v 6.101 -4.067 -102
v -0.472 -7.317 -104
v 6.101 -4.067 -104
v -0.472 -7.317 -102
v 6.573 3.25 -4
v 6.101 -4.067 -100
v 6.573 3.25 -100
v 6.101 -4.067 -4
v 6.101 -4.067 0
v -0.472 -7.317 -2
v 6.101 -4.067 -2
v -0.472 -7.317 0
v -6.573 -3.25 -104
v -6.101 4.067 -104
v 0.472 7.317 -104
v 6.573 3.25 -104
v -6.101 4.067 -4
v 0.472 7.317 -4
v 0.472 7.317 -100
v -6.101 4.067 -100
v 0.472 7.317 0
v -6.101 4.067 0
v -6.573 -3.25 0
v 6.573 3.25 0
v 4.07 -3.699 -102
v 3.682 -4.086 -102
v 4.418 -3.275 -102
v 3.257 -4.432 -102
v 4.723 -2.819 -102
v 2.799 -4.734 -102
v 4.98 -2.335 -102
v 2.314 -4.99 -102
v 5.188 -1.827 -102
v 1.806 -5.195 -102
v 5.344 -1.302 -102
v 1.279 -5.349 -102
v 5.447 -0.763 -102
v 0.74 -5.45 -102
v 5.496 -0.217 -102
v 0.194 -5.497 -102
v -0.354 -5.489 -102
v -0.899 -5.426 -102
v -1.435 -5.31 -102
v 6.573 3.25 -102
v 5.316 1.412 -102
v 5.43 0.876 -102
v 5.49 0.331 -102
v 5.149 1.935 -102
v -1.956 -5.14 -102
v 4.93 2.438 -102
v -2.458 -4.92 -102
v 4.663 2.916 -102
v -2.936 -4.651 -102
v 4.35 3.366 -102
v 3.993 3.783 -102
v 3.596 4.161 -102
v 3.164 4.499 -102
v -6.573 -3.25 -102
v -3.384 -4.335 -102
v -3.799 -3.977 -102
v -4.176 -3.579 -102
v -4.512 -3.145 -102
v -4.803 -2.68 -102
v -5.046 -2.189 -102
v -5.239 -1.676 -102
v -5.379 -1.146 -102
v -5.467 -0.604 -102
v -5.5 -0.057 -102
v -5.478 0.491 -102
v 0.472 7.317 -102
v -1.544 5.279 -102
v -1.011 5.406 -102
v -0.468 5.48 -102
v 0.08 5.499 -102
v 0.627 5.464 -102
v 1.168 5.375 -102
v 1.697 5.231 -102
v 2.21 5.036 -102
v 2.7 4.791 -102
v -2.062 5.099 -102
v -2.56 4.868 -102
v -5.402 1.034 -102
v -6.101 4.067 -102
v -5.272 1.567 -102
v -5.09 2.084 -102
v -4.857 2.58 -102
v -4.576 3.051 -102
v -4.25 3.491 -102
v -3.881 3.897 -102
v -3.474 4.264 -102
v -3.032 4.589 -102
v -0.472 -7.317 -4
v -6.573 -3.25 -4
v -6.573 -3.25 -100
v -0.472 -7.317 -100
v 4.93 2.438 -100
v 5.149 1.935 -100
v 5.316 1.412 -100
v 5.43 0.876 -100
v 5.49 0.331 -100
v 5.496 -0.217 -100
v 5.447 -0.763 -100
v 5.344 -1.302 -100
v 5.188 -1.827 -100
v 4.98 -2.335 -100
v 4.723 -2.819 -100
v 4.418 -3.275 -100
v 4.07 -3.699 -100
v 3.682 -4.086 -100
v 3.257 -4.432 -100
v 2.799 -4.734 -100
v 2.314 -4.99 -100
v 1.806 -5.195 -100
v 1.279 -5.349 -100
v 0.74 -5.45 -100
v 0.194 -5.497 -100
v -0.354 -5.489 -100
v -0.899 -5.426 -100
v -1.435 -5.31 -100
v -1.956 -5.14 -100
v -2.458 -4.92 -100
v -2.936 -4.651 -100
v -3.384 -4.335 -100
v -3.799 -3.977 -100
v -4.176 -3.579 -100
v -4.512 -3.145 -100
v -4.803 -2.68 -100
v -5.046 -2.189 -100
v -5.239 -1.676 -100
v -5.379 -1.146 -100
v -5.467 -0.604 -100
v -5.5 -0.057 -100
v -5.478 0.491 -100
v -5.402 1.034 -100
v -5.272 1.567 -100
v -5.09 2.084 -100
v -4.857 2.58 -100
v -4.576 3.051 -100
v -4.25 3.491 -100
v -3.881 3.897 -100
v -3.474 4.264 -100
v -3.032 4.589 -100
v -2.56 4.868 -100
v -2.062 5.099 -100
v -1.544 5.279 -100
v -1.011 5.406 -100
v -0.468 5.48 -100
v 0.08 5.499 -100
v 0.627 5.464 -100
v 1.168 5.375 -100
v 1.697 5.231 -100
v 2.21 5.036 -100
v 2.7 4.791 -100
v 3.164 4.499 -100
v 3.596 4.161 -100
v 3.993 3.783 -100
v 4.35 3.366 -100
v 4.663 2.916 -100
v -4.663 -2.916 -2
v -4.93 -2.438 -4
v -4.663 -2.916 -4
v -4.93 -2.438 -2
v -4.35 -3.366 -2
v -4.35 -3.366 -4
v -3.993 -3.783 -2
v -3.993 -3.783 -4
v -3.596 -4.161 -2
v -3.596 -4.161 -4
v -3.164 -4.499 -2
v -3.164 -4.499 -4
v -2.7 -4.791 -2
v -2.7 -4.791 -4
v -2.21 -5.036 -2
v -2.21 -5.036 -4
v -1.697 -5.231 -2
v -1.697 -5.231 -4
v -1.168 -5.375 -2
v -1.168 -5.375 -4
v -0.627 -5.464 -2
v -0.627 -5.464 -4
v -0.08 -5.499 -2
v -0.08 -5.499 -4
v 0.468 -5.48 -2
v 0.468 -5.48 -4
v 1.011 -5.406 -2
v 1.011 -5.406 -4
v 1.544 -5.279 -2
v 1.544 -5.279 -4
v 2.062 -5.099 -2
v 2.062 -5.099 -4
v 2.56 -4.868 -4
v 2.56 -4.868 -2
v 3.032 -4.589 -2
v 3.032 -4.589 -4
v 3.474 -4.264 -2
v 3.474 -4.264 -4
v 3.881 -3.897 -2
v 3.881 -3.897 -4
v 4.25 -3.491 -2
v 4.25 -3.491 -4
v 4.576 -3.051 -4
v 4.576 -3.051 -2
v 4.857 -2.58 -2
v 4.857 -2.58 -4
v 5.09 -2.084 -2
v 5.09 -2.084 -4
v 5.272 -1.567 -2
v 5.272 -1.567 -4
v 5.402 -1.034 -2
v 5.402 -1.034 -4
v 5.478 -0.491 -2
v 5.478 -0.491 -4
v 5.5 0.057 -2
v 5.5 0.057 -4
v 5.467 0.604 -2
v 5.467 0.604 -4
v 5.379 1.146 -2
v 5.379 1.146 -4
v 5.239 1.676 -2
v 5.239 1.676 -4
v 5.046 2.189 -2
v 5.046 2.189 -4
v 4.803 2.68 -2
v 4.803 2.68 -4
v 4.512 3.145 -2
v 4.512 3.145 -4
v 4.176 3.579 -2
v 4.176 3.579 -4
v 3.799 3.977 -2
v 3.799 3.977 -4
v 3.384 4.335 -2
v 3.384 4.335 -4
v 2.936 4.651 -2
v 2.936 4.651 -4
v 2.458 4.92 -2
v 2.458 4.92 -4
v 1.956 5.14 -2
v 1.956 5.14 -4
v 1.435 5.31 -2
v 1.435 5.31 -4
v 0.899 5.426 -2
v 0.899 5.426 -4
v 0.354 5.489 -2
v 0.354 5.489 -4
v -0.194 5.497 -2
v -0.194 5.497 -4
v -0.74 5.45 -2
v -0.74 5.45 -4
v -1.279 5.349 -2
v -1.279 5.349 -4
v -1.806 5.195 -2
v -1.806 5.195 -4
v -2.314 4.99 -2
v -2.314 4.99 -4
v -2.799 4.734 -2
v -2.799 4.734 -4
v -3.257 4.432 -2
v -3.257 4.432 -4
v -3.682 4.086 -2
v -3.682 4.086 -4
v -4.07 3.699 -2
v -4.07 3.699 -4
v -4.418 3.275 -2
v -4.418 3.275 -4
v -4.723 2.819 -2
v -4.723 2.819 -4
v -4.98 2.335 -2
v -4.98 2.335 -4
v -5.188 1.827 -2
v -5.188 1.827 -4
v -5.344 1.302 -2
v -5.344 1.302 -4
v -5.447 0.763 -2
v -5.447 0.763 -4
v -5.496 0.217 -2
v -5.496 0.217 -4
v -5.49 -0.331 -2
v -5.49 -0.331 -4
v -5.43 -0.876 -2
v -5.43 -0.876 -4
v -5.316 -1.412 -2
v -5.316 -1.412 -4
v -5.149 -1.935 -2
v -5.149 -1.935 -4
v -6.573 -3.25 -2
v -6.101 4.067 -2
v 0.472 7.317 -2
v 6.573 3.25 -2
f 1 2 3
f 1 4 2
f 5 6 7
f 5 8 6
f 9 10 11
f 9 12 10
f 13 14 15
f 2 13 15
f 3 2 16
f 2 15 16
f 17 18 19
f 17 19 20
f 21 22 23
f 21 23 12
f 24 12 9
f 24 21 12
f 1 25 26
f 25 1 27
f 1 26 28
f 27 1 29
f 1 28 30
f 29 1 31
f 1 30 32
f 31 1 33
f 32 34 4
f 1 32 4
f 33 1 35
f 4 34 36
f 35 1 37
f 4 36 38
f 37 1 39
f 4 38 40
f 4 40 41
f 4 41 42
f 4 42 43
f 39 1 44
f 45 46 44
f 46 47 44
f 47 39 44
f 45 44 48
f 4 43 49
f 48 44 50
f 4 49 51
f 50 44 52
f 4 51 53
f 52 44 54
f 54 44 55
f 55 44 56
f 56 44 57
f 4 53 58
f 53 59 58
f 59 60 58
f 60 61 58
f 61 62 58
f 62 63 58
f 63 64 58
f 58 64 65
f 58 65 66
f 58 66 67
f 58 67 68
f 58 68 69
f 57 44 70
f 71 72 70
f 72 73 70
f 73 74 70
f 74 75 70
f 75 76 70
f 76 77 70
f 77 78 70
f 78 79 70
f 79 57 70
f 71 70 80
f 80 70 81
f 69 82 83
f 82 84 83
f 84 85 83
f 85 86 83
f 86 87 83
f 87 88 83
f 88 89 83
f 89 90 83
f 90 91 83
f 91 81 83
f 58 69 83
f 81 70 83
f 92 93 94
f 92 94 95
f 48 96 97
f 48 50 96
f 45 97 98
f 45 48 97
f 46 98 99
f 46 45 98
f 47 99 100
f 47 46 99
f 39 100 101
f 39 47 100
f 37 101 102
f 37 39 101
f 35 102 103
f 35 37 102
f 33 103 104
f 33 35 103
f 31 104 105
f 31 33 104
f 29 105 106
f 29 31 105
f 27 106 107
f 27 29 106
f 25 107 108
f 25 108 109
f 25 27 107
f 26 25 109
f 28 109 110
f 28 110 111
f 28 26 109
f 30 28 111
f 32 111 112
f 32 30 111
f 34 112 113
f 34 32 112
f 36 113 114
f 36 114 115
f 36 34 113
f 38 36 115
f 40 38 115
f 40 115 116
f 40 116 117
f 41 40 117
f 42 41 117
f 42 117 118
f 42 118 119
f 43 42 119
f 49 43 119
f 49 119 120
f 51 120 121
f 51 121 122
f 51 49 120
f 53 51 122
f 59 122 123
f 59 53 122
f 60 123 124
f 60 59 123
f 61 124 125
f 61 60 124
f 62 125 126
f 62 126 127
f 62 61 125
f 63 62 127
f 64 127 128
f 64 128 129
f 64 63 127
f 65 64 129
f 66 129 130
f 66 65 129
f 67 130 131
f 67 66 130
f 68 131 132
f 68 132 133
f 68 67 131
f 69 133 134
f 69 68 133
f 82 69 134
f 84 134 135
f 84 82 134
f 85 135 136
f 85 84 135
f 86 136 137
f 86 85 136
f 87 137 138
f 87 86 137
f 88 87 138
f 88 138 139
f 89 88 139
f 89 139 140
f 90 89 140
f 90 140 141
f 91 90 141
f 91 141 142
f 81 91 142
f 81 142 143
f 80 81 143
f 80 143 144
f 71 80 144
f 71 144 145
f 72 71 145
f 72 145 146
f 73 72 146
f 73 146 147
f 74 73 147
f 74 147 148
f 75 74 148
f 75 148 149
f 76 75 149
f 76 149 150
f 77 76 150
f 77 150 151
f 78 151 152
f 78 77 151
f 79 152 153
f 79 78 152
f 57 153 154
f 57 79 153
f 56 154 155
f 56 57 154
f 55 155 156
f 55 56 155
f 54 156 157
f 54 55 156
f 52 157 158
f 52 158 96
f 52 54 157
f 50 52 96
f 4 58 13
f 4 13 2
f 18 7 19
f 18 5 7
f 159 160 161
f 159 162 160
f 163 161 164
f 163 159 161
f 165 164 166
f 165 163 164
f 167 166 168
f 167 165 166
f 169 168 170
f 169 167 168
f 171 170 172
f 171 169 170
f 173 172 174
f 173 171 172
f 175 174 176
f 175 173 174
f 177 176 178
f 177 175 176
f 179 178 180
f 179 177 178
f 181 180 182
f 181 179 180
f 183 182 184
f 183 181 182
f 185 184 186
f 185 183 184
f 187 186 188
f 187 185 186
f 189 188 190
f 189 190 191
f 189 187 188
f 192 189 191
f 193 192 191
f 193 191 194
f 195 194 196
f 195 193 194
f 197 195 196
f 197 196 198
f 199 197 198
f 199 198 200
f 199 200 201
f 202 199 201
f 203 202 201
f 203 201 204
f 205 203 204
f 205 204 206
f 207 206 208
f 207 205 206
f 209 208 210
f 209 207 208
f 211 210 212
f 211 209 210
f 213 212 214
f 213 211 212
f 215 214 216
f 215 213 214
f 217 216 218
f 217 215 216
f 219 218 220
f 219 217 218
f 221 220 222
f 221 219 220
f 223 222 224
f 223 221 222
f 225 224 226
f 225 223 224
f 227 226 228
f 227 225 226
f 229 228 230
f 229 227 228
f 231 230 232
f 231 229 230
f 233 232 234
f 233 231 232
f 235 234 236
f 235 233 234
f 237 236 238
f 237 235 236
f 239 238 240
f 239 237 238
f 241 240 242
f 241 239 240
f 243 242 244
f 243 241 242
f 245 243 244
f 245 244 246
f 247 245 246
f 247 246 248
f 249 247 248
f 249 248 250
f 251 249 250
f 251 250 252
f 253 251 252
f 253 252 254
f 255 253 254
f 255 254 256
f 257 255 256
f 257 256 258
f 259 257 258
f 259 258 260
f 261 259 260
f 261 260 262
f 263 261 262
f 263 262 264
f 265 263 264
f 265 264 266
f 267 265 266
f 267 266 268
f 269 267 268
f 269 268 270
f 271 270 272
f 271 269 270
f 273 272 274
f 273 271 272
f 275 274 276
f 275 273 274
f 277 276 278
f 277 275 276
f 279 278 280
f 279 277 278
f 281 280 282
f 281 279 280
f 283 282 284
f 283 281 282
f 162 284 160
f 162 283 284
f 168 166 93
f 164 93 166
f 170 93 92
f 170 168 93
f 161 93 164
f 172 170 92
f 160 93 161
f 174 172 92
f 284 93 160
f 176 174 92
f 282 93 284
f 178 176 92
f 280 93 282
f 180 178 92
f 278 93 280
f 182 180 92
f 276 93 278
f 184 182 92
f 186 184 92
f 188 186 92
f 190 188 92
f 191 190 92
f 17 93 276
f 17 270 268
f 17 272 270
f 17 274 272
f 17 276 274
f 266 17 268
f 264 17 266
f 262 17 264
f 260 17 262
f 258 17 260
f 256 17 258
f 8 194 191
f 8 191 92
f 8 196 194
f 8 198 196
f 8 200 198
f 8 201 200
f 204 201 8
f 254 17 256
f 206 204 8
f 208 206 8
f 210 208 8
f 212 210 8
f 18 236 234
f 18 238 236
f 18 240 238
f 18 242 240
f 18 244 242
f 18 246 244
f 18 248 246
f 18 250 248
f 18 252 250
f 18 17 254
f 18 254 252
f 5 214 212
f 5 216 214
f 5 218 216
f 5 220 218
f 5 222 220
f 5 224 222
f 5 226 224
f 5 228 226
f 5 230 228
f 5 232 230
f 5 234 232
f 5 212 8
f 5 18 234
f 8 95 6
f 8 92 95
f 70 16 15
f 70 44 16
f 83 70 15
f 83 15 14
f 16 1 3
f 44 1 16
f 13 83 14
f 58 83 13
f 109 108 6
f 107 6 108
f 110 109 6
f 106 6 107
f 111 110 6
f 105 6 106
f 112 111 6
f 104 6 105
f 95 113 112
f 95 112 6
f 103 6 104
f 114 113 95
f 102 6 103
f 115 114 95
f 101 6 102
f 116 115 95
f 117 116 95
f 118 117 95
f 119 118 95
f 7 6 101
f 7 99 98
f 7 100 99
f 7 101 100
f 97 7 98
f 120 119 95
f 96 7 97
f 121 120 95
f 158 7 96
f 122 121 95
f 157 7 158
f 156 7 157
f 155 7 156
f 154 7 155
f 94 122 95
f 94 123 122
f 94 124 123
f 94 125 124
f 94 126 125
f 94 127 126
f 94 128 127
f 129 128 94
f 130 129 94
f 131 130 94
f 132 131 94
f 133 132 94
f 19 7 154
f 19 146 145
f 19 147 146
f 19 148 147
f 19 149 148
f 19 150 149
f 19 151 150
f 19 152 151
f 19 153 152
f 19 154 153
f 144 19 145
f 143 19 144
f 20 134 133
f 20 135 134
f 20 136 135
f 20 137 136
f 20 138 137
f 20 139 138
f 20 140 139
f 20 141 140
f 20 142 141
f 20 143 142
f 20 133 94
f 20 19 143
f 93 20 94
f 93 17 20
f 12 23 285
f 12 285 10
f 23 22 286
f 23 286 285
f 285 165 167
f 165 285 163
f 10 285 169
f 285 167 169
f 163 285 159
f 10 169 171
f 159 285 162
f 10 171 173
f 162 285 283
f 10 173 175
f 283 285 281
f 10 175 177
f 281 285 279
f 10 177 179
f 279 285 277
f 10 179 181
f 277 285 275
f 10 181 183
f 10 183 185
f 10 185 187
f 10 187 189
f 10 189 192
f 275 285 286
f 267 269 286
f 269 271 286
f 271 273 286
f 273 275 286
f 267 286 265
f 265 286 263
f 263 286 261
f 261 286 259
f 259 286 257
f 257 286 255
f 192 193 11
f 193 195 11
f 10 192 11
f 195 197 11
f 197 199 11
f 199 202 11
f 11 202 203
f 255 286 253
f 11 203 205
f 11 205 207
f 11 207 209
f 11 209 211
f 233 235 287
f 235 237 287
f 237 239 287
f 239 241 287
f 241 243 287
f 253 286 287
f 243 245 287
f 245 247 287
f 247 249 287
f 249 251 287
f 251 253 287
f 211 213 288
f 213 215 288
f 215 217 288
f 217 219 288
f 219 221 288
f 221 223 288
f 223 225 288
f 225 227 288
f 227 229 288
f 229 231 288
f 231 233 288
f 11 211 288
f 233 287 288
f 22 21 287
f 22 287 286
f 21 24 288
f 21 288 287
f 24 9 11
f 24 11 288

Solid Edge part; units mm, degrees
sketch "Sketch1" plane through (0, 0, 0) normal (0, 0, 1) x (1, 0, 0)
  line L0 (-6.1009, 4.0673) -> (-6.5728, -3.2499)
  line L1 (-6.5728, -3.2499) -> (-0.4719, -7.3171)
  line L2 (-0.4719, -7.3171) -> (6.1009, -4.0673)
  line L3 (6.1009, -4.0673) -> (6.5728, 3.2499)
  line L4 (6.5728, 3.2499) -> (0.4719, 7.3171)
  line L5 (0.4719, 7.3171) -> (-6.1009, 4.0673)
extrude "Protrusion1" add sketch "Sketch1" against normal blind 104
sketch "Sketch2" plane through (0, 0, -2) normal (0, 0, 1) x (-0.8964, -0.4432, 0)
  circle A0 centre (0, 0) radius 5.5
  circle A1 centre (0, 0) radius 13.1424
extrude "ExtrudedCutout_1" cut sketch "Sketch2" against normal blind 2
sketch "Sketch3" plane through (0, 0, -102) normal (0, 0, -1) x (0.8964, 0.4432, 0)
  circle A0 centre (0, 0) radius 5.5
  circle A1 centre (0, 0) radius 13.1424
extrude "ExtrudedCutout_2" cut sketch "Sketch3" against normal blind 2
properties part number "BumbleB0660"
